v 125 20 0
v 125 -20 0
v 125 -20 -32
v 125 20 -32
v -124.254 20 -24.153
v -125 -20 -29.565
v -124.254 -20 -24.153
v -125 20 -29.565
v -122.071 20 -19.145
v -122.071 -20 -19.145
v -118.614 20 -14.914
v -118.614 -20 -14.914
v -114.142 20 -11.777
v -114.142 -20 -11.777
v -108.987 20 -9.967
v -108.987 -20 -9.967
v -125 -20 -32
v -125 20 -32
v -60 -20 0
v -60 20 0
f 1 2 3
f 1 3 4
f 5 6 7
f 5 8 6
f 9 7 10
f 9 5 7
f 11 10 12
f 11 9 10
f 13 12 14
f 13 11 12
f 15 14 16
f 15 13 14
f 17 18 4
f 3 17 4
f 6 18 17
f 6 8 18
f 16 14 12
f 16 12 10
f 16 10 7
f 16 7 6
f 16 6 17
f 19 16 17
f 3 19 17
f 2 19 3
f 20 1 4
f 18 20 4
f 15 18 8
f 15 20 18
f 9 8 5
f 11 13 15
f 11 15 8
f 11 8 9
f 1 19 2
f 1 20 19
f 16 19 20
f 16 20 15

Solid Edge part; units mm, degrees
sketch "Sketch1" plane through (0, 0, 0) normal (0, 0, 1) x (1, 0, 0)
  line L0 (-125, -20) -> (125, -20)
  line L1 (125, -20) -> (125, 20)
  line L2 (125, 20) -> (-125, 20)
  line L3 (-125, 20) -> (-125, -20)
extrude "Protrusion1" add sketch "Sketch1" against normal blind 32
sketch "Sketch2" plane through (0, -20, -16) normal (0, -1, 0) x (1, 0, 0)
  line L0 (-125, 16) -> (-60, 16)
  line L1 (-60, 16) -> (-125, 2.7756)
  line L2 (-125, 2.7756) -> (-125, 16)
extrude "ExtrudedCutout_1" cut sketch "Sketch2" against normal blind 180
fillet "Round_1" radius 20 1 edges at (-125, 0, -13.2244)
